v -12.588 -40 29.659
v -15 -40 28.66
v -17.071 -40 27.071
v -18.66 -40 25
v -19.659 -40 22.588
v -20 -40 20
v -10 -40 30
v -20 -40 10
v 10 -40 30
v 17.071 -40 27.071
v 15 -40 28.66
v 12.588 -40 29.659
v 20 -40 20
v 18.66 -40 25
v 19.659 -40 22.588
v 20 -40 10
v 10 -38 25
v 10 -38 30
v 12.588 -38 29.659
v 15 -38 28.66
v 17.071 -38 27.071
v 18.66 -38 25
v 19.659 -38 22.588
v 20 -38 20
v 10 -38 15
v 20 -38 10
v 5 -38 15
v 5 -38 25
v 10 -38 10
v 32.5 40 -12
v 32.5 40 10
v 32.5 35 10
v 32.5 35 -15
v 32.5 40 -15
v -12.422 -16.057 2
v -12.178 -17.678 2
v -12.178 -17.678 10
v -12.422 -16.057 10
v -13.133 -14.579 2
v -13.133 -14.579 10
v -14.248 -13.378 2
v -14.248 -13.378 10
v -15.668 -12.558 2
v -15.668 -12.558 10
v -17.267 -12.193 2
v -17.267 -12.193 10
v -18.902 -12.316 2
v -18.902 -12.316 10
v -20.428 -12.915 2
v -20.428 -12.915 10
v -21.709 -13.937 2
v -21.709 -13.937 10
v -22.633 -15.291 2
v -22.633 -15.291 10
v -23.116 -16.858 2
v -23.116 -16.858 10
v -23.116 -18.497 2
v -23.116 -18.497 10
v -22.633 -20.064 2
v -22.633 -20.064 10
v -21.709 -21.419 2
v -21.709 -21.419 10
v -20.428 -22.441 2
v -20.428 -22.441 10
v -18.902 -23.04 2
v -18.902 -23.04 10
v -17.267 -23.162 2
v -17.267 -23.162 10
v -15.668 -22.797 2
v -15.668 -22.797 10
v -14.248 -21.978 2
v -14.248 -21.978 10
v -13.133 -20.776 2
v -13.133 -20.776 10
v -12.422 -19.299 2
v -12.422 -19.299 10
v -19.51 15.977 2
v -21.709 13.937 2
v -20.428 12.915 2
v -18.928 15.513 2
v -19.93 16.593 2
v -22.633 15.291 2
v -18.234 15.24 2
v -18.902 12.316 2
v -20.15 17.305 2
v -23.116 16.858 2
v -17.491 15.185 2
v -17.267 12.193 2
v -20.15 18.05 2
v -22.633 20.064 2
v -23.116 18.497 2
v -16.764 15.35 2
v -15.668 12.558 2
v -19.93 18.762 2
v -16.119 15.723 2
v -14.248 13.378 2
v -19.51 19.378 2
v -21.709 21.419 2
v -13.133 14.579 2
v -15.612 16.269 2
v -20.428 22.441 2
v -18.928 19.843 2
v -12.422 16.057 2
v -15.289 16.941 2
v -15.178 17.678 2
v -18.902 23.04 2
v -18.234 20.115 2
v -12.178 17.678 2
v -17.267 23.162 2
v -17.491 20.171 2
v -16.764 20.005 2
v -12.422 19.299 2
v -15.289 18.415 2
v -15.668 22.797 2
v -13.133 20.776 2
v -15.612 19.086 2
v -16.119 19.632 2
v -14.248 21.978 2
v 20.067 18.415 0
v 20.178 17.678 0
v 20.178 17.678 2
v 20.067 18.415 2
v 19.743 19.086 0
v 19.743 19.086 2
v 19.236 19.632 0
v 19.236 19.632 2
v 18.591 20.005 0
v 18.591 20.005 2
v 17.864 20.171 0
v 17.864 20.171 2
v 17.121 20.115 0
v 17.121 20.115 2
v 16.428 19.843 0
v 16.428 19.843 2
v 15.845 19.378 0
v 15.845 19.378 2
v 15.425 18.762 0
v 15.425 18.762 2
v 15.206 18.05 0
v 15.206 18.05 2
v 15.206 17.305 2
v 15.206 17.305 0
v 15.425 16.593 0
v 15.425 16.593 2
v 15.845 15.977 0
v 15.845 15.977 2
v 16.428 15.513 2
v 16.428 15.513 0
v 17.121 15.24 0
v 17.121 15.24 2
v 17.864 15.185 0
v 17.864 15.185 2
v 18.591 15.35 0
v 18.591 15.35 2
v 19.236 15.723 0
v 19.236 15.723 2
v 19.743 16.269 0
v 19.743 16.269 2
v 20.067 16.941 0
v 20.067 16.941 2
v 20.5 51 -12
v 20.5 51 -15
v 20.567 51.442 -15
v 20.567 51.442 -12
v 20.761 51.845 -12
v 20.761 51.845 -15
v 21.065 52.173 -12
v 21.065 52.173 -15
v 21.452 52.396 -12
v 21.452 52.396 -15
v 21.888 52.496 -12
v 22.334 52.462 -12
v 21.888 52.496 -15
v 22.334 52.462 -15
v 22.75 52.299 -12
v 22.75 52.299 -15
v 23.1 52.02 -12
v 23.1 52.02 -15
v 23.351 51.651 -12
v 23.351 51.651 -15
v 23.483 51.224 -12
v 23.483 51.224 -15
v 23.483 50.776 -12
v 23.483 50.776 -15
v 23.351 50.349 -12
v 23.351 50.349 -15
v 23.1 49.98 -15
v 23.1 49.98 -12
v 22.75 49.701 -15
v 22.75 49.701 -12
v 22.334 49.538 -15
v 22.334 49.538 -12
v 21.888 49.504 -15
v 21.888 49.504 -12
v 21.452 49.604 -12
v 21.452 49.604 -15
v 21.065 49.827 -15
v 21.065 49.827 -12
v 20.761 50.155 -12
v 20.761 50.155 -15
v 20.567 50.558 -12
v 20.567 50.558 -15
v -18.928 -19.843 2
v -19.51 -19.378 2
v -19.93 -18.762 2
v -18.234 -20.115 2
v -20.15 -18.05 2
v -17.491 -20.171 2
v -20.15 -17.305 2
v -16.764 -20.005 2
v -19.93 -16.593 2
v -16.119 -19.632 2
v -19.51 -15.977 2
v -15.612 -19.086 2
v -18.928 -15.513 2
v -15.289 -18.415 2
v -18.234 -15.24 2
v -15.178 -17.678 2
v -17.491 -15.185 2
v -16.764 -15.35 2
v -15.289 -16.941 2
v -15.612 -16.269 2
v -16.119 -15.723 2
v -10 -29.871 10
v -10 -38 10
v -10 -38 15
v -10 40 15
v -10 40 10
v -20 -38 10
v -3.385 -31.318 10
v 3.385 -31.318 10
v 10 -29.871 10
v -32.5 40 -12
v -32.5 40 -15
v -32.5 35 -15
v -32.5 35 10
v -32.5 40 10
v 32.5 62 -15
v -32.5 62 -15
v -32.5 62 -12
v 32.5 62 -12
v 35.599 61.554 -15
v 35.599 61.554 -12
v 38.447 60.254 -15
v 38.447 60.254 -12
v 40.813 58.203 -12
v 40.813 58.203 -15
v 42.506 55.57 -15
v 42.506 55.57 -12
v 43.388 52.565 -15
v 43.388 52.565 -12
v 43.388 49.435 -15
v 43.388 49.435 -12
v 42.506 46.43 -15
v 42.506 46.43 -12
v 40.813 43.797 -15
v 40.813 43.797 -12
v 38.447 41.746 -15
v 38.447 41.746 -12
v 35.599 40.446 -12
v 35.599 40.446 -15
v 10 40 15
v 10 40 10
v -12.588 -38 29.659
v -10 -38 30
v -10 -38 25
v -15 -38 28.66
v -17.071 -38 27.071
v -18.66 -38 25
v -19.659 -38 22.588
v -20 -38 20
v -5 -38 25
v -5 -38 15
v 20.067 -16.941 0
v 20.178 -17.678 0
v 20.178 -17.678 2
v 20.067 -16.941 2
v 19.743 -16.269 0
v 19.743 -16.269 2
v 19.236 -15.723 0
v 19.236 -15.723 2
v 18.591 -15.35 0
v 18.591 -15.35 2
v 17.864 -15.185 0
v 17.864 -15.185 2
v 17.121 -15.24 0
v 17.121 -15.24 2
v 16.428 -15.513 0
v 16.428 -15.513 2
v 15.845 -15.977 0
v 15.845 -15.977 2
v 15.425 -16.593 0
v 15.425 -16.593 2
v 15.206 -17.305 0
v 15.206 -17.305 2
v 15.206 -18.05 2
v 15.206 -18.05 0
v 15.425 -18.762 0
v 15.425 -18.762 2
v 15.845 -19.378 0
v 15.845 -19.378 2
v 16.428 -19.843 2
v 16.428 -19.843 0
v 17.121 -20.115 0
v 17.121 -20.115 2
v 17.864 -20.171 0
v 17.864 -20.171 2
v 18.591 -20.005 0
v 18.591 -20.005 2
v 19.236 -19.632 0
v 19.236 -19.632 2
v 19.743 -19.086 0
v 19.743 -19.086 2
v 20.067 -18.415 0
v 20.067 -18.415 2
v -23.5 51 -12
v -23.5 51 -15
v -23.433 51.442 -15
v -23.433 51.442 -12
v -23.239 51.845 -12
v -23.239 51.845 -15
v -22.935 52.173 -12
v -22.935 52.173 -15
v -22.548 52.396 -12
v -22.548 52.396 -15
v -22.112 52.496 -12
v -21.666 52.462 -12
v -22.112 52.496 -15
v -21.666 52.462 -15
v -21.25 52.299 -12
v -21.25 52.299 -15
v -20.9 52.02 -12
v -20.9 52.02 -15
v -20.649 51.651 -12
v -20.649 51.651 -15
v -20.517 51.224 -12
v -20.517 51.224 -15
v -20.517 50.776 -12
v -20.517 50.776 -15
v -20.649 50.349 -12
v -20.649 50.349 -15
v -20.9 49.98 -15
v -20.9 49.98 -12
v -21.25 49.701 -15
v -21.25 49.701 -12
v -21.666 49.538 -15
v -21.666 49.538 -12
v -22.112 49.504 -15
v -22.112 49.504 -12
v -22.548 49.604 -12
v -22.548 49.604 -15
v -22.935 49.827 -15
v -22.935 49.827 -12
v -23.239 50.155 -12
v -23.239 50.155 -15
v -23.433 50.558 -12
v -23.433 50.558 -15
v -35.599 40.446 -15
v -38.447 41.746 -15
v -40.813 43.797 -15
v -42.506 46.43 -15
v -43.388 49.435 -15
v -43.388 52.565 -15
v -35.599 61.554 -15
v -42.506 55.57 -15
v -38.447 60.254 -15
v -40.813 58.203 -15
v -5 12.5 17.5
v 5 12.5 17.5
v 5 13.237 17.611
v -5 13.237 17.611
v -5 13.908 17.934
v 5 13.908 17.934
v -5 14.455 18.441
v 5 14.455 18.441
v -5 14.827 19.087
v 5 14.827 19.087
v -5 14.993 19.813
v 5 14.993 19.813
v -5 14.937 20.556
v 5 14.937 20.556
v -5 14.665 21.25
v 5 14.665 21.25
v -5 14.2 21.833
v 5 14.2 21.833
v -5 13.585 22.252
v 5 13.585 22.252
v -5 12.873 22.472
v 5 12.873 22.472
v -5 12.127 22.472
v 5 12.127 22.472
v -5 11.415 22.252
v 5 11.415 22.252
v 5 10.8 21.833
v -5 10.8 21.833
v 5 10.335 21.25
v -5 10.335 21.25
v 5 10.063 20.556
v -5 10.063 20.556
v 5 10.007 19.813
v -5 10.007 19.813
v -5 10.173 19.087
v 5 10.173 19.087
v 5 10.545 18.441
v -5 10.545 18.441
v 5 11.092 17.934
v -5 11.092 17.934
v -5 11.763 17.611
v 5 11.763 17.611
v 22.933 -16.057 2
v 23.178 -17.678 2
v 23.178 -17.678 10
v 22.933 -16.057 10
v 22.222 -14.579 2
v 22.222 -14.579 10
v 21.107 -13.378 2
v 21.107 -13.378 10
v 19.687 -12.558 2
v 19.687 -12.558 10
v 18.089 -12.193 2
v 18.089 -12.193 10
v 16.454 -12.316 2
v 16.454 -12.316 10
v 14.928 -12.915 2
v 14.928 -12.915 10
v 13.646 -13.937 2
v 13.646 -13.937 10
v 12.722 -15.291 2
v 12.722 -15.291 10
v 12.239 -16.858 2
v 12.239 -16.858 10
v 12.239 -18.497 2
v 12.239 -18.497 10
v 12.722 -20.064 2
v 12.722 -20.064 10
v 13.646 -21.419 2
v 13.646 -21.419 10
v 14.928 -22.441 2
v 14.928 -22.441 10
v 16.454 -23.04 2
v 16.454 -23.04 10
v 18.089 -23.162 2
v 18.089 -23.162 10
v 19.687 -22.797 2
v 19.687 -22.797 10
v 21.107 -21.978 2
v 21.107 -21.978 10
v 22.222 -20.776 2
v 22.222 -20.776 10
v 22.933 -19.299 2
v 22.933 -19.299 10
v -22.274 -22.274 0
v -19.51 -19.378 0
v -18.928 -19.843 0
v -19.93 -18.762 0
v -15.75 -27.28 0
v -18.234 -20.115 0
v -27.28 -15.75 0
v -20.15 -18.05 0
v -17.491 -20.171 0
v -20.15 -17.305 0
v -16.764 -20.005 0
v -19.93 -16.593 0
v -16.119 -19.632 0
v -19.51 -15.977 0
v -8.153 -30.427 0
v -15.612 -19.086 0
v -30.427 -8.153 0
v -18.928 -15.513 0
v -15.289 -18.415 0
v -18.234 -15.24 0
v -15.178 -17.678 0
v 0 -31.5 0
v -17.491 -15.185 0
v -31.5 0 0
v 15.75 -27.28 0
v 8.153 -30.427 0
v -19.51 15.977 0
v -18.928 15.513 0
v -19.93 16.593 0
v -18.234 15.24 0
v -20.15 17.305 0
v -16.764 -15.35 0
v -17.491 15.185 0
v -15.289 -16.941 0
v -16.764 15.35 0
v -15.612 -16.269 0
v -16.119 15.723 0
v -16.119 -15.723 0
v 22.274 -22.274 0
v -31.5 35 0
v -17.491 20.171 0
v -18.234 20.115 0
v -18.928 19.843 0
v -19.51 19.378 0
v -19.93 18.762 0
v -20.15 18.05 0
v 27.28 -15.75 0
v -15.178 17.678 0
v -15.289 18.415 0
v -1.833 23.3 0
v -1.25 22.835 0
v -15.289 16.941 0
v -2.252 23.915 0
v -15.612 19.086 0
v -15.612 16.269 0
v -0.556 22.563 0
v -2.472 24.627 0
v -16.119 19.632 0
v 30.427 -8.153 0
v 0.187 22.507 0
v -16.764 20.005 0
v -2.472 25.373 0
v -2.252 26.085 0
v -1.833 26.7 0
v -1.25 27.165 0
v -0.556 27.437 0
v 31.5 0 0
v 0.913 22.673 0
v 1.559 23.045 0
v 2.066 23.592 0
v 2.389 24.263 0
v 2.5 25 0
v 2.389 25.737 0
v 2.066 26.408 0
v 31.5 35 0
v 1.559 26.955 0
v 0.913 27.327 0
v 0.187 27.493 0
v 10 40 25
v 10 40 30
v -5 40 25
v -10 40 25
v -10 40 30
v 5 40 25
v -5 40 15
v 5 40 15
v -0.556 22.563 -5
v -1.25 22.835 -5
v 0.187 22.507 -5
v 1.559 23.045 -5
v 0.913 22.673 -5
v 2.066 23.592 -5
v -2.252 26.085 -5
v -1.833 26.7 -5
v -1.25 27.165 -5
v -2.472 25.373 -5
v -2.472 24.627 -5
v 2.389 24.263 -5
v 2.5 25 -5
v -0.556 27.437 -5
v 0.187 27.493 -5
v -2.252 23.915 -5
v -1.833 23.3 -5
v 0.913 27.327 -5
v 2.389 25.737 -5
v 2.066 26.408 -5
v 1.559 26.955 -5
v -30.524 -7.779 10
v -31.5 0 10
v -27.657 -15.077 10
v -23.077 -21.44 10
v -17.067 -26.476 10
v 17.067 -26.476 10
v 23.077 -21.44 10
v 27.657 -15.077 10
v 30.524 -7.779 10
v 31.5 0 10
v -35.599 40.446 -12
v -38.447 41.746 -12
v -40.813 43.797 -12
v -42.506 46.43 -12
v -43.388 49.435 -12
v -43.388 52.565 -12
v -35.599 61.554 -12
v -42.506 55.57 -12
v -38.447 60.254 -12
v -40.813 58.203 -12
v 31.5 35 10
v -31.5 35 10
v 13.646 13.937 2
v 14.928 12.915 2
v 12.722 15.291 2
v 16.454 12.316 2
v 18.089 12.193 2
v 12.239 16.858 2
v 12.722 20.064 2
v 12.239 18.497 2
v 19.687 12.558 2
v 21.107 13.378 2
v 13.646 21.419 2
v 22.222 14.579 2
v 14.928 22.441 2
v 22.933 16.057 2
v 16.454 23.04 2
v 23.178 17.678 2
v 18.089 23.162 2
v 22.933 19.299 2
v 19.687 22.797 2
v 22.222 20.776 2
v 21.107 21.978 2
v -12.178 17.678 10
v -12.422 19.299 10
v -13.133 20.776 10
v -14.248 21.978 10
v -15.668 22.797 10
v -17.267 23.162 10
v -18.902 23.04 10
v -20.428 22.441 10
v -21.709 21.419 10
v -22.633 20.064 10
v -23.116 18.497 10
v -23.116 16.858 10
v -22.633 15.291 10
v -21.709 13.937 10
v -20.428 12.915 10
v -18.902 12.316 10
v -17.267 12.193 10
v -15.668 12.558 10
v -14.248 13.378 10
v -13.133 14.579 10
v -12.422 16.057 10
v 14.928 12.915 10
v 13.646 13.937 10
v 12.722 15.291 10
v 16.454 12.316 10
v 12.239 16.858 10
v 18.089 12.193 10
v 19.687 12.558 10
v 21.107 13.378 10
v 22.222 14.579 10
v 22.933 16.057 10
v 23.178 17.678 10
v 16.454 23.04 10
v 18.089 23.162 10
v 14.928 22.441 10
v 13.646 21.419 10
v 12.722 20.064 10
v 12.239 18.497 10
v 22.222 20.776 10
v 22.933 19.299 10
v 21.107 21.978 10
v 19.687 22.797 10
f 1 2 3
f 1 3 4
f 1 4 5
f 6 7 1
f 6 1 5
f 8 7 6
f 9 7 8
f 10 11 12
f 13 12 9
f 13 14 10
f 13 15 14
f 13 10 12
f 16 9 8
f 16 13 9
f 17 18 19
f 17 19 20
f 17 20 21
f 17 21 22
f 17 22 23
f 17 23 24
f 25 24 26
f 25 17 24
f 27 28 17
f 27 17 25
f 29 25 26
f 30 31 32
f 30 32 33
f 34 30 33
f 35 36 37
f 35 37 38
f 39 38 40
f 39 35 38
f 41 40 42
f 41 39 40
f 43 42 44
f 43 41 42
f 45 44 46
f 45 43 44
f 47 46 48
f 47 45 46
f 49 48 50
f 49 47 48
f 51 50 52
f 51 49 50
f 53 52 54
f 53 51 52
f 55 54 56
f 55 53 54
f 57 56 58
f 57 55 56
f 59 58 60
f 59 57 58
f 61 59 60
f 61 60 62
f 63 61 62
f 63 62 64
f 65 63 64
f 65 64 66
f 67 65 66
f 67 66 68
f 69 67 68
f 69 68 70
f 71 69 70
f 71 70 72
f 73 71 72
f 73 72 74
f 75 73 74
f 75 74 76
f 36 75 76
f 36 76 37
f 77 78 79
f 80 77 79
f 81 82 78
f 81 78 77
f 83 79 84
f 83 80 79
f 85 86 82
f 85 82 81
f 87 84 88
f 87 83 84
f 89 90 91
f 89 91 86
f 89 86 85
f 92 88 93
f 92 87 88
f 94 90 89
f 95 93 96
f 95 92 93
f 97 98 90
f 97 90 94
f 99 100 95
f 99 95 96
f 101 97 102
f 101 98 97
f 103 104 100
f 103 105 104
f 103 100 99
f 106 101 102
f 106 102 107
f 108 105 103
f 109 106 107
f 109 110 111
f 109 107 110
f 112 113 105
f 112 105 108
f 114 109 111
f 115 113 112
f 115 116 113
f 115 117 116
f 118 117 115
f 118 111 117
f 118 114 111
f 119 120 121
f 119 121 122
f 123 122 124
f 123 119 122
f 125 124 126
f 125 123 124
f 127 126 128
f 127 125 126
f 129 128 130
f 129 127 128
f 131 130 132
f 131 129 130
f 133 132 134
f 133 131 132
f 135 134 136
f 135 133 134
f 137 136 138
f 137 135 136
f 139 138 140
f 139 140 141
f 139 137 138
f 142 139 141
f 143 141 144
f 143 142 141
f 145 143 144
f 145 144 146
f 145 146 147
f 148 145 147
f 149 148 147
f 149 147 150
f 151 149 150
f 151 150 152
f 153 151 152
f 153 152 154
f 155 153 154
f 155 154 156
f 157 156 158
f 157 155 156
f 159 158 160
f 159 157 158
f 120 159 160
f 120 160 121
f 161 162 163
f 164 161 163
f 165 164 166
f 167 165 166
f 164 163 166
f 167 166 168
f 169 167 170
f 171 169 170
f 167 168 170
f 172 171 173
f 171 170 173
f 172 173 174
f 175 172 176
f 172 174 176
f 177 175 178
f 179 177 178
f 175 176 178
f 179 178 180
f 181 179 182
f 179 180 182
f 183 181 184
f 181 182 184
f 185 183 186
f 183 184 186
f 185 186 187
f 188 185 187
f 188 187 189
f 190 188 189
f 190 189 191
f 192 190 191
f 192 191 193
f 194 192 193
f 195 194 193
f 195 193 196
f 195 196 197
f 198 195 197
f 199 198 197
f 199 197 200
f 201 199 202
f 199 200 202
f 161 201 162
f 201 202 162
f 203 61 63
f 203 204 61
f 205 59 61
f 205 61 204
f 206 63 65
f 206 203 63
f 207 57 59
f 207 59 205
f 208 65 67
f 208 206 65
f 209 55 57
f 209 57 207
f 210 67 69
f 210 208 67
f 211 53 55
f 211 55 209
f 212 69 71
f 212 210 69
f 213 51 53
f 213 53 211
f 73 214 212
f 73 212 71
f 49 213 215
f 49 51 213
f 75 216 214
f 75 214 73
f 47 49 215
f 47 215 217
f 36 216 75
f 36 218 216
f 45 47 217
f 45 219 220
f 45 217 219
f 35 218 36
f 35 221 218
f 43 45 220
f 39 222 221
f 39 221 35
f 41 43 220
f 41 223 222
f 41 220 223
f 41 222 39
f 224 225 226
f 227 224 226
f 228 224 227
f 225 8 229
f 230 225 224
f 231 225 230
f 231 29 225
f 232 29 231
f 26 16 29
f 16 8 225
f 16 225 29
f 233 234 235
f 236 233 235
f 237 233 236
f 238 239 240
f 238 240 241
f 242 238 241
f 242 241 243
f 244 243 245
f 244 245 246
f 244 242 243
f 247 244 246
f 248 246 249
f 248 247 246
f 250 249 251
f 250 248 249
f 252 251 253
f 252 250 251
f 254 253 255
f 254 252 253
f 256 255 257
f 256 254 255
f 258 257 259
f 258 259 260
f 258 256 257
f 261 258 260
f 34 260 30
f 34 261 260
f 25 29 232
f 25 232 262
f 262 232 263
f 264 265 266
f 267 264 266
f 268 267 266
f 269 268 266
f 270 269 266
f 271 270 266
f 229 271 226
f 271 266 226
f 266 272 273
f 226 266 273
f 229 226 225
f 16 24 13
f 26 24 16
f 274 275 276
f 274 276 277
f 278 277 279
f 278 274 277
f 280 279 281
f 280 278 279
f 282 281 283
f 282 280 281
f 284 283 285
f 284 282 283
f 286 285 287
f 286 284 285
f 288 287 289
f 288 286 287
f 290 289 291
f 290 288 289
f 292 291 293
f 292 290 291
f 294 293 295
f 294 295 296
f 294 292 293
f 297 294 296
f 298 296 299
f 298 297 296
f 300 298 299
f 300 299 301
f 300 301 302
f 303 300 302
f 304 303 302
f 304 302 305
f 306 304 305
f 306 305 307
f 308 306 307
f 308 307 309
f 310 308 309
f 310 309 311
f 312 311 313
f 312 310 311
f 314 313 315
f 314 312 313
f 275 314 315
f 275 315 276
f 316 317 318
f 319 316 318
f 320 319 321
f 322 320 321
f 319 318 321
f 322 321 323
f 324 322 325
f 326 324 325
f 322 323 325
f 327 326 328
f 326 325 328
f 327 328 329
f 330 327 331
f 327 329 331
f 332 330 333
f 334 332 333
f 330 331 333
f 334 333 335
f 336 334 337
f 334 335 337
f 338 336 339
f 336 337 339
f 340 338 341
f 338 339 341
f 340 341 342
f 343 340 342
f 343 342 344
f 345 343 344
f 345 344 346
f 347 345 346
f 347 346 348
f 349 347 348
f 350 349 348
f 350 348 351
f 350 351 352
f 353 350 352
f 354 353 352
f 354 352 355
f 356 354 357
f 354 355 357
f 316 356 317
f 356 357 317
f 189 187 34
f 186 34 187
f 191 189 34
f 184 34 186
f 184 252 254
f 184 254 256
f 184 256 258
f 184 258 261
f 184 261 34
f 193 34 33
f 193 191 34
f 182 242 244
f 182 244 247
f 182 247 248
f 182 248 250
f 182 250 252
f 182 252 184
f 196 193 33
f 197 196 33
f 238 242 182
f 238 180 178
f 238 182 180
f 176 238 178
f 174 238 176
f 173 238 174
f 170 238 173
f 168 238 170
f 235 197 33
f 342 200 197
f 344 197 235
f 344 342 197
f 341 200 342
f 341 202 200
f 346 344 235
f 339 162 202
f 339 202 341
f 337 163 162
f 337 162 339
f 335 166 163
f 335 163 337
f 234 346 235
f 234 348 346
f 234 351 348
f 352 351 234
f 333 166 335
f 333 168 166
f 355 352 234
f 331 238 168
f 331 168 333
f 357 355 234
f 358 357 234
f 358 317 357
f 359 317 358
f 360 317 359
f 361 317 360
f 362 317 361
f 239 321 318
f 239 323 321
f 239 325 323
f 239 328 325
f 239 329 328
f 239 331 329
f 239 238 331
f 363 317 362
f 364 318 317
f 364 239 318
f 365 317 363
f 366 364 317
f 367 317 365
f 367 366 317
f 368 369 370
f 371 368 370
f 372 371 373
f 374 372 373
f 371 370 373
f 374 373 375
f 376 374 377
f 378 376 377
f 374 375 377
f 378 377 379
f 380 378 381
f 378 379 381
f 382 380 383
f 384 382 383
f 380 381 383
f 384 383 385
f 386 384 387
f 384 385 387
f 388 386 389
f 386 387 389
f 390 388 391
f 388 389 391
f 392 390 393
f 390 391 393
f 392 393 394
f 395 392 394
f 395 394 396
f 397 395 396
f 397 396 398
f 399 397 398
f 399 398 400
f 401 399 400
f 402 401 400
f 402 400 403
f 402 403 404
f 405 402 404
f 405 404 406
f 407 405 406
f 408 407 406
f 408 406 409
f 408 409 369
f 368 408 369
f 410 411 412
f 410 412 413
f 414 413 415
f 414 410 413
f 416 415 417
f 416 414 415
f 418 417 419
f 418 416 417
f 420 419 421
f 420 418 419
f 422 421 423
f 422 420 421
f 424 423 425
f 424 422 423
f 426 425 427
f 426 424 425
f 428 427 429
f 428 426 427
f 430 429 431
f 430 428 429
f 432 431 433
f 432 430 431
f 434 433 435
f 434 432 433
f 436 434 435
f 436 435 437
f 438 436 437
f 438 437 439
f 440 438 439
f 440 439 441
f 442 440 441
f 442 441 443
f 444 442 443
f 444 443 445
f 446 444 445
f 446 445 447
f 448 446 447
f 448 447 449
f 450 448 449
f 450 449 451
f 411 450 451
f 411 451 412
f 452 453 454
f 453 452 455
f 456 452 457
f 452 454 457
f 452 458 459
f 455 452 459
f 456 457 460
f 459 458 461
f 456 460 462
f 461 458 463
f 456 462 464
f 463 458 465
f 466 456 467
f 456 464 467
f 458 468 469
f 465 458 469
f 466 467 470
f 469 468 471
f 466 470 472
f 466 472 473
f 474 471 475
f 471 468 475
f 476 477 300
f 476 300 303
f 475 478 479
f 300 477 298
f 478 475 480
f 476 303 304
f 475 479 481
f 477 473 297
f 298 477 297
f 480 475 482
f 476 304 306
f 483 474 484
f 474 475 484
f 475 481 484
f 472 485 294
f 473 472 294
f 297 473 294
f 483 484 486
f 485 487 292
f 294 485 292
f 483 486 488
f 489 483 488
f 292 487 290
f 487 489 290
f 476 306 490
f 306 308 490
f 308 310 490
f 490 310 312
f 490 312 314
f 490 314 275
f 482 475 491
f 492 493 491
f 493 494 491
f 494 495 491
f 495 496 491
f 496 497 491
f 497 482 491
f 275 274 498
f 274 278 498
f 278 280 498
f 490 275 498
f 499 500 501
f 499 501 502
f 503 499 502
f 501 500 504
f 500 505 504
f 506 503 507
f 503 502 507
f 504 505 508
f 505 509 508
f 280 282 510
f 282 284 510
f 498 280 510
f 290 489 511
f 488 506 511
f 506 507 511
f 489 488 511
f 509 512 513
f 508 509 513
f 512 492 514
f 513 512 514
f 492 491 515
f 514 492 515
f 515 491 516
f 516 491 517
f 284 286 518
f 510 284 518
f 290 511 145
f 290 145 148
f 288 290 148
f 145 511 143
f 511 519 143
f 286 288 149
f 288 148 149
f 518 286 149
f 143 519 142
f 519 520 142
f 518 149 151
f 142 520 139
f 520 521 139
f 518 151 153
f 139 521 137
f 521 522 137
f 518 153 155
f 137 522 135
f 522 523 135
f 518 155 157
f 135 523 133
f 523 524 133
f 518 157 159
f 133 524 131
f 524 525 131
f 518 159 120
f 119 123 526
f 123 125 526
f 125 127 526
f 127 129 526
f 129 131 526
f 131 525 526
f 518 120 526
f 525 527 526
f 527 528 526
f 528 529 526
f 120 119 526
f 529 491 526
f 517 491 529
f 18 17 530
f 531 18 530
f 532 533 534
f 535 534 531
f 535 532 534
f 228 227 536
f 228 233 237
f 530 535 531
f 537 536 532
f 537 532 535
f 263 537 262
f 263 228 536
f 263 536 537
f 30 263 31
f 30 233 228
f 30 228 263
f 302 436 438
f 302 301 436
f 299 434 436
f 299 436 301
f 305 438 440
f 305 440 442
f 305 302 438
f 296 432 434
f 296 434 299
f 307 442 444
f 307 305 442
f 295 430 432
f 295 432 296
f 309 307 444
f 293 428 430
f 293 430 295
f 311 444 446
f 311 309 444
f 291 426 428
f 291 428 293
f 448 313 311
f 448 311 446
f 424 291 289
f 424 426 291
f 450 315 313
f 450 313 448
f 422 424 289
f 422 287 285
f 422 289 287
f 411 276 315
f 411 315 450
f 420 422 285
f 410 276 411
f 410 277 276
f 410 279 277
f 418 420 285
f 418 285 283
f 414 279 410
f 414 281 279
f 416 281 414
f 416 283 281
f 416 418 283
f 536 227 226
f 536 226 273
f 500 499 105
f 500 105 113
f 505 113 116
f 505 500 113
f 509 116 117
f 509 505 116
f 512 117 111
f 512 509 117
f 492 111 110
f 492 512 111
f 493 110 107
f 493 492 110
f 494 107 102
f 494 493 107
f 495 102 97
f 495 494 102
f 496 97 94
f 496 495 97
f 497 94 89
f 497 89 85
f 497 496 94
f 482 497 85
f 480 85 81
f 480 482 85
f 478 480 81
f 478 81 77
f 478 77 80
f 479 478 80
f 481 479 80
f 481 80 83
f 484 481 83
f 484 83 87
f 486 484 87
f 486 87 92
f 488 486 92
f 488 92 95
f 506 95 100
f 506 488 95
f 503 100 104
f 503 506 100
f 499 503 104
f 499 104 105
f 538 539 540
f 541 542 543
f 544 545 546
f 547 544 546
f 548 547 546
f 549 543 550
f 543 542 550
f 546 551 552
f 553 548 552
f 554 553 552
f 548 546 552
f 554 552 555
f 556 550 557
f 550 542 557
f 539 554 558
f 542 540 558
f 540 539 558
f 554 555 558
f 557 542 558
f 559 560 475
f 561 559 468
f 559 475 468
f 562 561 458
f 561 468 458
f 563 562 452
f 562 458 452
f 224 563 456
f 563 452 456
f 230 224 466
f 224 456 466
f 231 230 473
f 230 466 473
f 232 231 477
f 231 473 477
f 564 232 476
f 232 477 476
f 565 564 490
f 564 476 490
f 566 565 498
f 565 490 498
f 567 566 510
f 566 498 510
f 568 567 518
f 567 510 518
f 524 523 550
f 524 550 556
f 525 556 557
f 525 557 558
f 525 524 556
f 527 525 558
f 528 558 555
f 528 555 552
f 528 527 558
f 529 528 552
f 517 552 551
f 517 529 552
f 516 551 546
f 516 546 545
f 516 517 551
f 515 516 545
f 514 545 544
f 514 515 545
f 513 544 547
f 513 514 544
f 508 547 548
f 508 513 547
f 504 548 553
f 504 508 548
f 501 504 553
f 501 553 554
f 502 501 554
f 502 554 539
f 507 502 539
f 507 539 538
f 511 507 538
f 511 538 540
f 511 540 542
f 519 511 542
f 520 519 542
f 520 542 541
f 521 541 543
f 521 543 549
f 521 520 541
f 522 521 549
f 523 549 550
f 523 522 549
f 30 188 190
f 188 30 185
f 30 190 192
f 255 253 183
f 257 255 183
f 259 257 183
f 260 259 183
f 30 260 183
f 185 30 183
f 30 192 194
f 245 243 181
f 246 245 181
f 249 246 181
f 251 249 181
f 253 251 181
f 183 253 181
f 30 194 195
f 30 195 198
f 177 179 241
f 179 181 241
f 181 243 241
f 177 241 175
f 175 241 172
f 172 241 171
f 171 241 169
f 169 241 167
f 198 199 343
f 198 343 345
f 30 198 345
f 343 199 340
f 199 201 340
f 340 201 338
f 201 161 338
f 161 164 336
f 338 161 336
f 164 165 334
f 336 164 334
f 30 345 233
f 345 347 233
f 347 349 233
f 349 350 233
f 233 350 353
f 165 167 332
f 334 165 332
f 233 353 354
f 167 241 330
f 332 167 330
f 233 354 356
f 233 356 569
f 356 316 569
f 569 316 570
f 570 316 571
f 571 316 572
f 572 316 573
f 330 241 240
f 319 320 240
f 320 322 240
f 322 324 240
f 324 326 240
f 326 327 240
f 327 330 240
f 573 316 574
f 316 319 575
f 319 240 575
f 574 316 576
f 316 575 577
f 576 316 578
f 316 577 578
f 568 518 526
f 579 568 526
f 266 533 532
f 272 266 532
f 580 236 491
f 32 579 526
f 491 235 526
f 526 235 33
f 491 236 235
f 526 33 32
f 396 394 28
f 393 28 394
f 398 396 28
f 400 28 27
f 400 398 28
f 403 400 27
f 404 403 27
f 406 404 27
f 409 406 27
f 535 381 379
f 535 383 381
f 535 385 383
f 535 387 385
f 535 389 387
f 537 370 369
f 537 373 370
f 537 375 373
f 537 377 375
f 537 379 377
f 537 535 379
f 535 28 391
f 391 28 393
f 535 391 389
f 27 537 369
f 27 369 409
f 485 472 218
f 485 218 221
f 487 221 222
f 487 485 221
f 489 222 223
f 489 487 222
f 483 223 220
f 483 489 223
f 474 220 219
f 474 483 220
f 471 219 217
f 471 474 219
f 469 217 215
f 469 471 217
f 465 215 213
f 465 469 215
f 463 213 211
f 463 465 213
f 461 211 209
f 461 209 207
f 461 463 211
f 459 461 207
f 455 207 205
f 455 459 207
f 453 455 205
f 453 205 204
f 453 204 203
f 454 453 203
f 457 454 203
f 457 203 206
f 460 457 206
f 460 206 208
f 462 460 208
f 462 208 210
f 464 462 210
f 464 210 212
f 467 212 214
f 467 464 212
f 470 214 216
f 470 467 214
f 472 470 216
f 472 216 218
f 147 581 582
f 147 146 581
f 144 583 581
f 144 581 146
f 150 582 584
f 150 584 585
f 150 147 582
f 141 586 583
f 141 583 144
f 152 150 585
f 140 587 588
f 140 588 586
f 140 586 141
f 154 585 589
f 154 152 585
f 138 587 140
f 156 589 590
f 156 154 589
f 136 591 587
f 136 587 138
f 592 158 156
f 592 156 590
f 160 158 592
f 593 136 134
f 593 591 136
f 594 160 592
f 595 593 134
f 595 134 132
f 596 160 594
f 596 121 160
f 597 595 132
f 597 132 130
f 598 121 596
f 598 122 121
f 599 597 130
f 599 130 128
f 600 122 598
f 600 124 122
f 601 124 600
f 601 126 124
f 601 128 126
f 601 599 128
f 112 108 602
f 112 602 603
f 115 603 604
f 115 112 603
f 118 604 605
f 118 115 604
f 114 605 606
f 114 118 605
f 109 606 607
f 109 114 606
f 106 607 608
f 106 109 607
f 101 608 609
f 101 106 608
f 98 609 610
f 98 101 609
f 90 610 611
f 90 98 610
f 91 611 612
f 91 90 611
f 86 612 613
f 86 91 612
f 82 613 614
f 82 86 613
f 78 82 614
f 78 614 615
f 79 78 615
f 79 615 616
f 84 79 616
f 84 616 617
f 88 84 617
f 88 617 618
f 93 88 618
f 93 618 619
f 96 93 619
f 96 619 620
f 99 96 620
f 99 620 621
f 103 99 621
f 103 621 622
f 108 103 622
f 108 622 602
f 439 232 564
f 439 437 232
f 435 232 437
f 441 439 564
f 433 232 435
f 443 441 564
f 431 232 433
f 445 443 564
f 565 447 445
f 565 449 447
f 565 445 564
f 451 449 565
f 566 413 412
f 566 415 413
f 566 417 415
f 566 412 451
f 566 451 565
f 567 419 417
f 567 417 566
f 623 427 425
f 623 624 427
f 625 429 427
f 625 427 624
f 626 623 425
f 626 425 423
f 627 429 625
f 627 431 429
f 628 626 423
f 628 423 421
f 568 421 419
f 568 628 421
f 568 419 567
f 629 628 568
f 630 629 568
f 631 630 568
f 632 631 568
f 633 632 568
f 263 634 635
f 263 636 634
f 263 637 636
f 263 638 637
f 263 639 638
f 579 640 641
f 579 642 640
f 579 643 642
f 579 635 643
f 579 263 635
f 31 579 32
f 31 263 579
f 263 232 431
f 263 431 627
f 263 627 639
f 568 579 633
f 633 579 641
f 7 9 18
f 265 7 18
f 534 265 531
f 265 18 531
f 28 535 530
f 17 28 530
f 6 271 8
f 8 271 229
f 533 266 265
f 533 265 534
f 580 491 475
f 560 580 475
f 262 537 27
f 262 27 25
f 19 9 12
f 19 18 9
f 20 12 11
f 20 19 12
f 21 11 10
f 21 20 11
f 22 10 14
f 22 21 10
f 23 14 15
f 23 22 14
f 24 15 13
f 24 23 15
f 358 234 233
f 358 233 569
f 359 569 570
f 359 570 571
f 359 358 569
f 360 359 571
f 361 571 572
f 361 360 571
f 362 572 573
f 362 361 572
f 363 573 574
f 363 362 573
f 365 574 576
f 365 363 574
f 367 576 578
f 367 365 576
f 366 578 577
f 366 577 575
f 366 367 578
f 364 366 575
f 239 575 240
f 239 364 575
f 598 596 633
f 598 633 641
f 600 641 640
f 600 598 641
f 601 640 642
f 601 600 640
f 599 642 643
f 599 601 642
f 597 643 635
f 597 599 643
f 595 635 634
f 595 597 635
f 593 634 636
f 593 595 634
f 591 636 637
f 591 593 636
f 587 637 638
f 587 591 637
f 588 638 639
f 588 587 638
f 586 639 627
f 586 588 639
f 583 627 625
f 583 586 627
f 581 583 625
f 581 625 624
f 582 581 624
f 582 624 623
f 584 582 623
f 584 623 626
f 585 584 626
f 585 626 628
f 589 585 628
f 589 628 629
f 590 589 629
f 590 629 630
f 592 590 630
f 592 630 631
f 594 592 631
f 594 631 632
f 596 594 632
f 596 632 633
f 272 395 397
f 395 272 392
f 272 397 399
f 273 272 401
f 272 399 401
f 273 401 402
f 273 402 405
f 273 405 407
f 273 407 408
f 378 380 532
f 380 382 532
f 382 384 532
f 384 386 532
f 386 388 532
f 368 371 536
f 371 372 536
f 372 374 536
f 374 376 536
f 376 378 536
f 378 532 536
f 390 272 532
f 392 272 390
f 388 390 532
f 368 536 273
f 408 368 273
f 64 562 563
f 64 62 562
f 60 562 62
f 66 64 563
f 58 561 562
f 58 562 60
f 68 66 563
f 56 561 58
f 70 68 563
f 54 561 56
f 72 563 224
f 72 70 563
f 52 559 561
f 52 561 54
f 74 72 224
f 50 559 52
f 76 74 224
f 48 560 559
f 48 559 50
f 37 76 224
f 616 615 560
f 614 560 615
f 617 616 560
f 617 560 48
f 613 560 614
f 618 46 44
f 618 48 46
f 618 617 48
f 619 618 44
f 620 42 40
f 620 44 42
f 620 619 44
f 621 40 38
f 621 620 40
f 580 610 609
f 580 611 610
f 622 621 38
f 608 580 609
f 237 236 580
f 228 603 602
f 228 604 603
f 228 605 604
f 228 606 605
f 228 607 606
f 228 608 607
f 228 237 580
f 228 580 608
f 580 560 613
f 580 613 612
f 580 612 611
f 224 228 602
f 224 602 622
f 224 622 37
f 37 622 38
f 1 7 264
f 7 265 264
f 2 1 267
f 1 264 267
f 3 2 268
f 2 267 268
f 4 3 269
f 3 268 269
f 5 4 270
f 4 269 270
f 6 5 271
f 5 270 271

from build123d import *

# Parameters (mm, degrees)
SKETCH1_R                = 5.5
BOSS_EXTRUDE1_DEPTH      = 10
SKETCH1_3_R              = 5.5
SKETCH1_3_R_2            = 2.5
BOSS_EXTRUDE2_DEPTH      = 2
SKETCH1_4_R              = 2.5
BOSS_EXTRUDE3_DEPTH      = 5
BOSS_EXTRUDE4_DEPTH      = 5
SKETCH4_W                = 20
SKETCH4_H                = 80
BOSS_EXTRUDE5_DEPTH      = 20
SKETCH5_W                = 20
SKETCH5_H                = 2
BOSS_EXTRUDE6_DEPTH      = 10
BOSS_EXTRUDE6_DEPTH_BACK = 30
SKETCH7_W                = 5
SKETCH7_H                = 10
CUT_EXTRUDE1_DEPTH       = 78
FILLET1_R                = 10
SKETCH9_R                = 2.5
CUT_EXTRUDE2_DEPTH       = 38.5
SKETCH14_R               = 1.5
BOSS_EXTRUDE8_DEPTH      = 3


with BuildPart() as part:
    # Sketch1 → Boss-Extrude1 (new body)
    with BuildSketch(Plane.XY):
        with BuildLine():
            Line((31.5, 0), (31.5, 40))
            Line((31.5, 40), (-31.5, 40))
            Line((-31.5, 40), (-31.5, 0))
            ThreePointArc((-31.5, 0), (0, -31.5), (31.5, 0))
        make_face()
        with Locations((17.67766953, -17.67766953)):
            Circle(SKETCH1_R, mode=Mode.SUBTRACT)
        with Locations((-17.67766953, -17.67766953)):
            Circle(SKETCH1_R, mode=Mode.SUBTRACT)
        with Locations((-17.67766953, 17.67766953)):
            Circle(SKETCH1_R, mode=Mode.SUBTRACT)
        with Locations((17.67766953, 17.67766953)):
            Circle(SKETCH1_R, mode=Mode.SUBTRACT)
    extrude(amount=BOSS_EXTRUDE1_DEPTH)

    # Sketch1_3 → Boss-Extrude2 (add)
    with BuildSketch(Plane.XY):
        with Locations((17.67766953, 17.67766953)):
            Circle(SKETCH1_3_R)
        with Locations((17.67766953, 17.67766953)):
            Circle(SKETCH1_3_R_2, mode=Mode.SUBTRACT)
        with Locations((17.67766953, -17.67766953)):
            Circle(SKETCH1_3_R)
        with Locations((17.67766953, -17.67766953)):
            Circle(SKETCH1_3_R_2, mode=Mode.SUBTRACT)
        with Locations((-17.67766953, -17.67766953)):
            Circle(SKETCH1_3_R)
        with Locations((-17.67766953, -17.67766953)):
            Circle(SKETCH1_3_R_2, mode=Mode.SUBTRACT)
        with Locations((-17.67766953, 17.67766953)):
            Circle(SKETCH1_3_R)
        with Locations((-17.67766953, 17.67766953)):
            Circle(SKETCH1_3_R_2, mode=Mode.SUBTRACT)
    extrude(amount=BOSS_EXTRUDE2_DEPTH)

    # Sketch1_4 → Boss-Extrude3 (add)
    with BuildSketch(Plane.XY):
        with Locations((0, 25)):
            Circle(SKETCH1_4_R)
    extrude(amount=-BOSS_EXTRUDE3_DEPTH)

    # Sketch2 → Boss-Extrude4 (add)
    with BuildSketch(Plane(origin=(0, 40, 0), x_dir=(1, 0, 0), z_dir=(0, 1, 0))):
        Polygon((-32.5, -10), (31.5, -10), (32.5, -10), (32.5, 15), (-32.5, 15), align=None)
    extrude(amount=-BOSS_EXTRUDE4_DEPTH)

    # Sketch4 → Boss-Extrude5 (add)
    with BuildSketch(Plane.XY.offset(10)):
        Rectangle(SKETCH4_W, SKETCH4_H)
    extrude(amount=BOSS_EXTRUDE5_DEPTH)

    # Sketch5 → Boss-Extrude6 (add, two sides)
    with BuildSketch(Plane(origin=(10, 0, 0), x_dir=(0, 0, -1), z_dir=(1, 0, 0))) as boss_extrude6_sk:
        with Locations((-20, -39)):
            Rectangle(SKETCH5_W, SKETCH5_H)
    extrude(amount=BOSS_EXTRUDE6_DEPTH)
    extrude(boss_extrude6_sk.sketch, amount=-BOSS_EXTRUDE6_DEPTH_BACK)

    # Sketch7 → Cut-Extrude1 (cut)
    with BuildSketch(Plane(origin=(0, 40, 0), x_dir=(1, 0, 0), z_dir=(0, 1, 0))):
        with Locations((-7.5, -20)):
            Rectangle(SKETCH7_W, SKETCH7_H)
        with Locations((7.5, -20)):
            Rectangle(SKETCH7_W, SKETCH7_H)
    extrude(amount=-CUT_EXTRUDE1_DEPTH, mode=Mode.SUBTRACT)

    # Fillet1
    fillet1_edges = [part.edges().sort_by_distance(p)[0] for p in [
        (-20, -39, 30),
        (20, -39, 30),
    ]]
    fillet(fillet1_edges, radius=FILLET1_R)

    # Sketch9 → Cut-Extrude2 (cut, through all)
    with BuildSketch(Plane(origin=(5, 0, 0), x_dir=(0, 0, -1), z_dir=(1, 0, 0))):
        with Locations((-20, 12.5)):
            Circle(SKETCH9_R)
    extrude(amount=-CUT_EXTRUDE2_DEPTH, mode=Mode.SUBTRACT)

    # Sketch14 → Boss-Extrude8 (add)
    with BuildSketch(Plane(origin=(0, 0, -15), x_dir=(-1, 0, 0), z_dir=(0, 0, -1))):
        with BuildLine():
            Line((32.5, 62), (-32.5, 62))
            ThreePointArc((-32.5, 62), (-43.5, 51), (-32.5, 40))
            Line((-32.5, 40), (32.5, 40))
            ThreePointArc((32.5, 40), (43.5, 51), (32.5, 62))
        make_face()
        with Locations((-22, 51)):
            Circle(SKETCH14_R, mode=Mode.SUBTRACT)
        with Locations((22, 51)):
            Circle(SKETCH14_R, mode=Mode.SUBTRACT)
    extrude(amount=-BOSS_EXTRUDE8_DEPTH)


solid = part.part
